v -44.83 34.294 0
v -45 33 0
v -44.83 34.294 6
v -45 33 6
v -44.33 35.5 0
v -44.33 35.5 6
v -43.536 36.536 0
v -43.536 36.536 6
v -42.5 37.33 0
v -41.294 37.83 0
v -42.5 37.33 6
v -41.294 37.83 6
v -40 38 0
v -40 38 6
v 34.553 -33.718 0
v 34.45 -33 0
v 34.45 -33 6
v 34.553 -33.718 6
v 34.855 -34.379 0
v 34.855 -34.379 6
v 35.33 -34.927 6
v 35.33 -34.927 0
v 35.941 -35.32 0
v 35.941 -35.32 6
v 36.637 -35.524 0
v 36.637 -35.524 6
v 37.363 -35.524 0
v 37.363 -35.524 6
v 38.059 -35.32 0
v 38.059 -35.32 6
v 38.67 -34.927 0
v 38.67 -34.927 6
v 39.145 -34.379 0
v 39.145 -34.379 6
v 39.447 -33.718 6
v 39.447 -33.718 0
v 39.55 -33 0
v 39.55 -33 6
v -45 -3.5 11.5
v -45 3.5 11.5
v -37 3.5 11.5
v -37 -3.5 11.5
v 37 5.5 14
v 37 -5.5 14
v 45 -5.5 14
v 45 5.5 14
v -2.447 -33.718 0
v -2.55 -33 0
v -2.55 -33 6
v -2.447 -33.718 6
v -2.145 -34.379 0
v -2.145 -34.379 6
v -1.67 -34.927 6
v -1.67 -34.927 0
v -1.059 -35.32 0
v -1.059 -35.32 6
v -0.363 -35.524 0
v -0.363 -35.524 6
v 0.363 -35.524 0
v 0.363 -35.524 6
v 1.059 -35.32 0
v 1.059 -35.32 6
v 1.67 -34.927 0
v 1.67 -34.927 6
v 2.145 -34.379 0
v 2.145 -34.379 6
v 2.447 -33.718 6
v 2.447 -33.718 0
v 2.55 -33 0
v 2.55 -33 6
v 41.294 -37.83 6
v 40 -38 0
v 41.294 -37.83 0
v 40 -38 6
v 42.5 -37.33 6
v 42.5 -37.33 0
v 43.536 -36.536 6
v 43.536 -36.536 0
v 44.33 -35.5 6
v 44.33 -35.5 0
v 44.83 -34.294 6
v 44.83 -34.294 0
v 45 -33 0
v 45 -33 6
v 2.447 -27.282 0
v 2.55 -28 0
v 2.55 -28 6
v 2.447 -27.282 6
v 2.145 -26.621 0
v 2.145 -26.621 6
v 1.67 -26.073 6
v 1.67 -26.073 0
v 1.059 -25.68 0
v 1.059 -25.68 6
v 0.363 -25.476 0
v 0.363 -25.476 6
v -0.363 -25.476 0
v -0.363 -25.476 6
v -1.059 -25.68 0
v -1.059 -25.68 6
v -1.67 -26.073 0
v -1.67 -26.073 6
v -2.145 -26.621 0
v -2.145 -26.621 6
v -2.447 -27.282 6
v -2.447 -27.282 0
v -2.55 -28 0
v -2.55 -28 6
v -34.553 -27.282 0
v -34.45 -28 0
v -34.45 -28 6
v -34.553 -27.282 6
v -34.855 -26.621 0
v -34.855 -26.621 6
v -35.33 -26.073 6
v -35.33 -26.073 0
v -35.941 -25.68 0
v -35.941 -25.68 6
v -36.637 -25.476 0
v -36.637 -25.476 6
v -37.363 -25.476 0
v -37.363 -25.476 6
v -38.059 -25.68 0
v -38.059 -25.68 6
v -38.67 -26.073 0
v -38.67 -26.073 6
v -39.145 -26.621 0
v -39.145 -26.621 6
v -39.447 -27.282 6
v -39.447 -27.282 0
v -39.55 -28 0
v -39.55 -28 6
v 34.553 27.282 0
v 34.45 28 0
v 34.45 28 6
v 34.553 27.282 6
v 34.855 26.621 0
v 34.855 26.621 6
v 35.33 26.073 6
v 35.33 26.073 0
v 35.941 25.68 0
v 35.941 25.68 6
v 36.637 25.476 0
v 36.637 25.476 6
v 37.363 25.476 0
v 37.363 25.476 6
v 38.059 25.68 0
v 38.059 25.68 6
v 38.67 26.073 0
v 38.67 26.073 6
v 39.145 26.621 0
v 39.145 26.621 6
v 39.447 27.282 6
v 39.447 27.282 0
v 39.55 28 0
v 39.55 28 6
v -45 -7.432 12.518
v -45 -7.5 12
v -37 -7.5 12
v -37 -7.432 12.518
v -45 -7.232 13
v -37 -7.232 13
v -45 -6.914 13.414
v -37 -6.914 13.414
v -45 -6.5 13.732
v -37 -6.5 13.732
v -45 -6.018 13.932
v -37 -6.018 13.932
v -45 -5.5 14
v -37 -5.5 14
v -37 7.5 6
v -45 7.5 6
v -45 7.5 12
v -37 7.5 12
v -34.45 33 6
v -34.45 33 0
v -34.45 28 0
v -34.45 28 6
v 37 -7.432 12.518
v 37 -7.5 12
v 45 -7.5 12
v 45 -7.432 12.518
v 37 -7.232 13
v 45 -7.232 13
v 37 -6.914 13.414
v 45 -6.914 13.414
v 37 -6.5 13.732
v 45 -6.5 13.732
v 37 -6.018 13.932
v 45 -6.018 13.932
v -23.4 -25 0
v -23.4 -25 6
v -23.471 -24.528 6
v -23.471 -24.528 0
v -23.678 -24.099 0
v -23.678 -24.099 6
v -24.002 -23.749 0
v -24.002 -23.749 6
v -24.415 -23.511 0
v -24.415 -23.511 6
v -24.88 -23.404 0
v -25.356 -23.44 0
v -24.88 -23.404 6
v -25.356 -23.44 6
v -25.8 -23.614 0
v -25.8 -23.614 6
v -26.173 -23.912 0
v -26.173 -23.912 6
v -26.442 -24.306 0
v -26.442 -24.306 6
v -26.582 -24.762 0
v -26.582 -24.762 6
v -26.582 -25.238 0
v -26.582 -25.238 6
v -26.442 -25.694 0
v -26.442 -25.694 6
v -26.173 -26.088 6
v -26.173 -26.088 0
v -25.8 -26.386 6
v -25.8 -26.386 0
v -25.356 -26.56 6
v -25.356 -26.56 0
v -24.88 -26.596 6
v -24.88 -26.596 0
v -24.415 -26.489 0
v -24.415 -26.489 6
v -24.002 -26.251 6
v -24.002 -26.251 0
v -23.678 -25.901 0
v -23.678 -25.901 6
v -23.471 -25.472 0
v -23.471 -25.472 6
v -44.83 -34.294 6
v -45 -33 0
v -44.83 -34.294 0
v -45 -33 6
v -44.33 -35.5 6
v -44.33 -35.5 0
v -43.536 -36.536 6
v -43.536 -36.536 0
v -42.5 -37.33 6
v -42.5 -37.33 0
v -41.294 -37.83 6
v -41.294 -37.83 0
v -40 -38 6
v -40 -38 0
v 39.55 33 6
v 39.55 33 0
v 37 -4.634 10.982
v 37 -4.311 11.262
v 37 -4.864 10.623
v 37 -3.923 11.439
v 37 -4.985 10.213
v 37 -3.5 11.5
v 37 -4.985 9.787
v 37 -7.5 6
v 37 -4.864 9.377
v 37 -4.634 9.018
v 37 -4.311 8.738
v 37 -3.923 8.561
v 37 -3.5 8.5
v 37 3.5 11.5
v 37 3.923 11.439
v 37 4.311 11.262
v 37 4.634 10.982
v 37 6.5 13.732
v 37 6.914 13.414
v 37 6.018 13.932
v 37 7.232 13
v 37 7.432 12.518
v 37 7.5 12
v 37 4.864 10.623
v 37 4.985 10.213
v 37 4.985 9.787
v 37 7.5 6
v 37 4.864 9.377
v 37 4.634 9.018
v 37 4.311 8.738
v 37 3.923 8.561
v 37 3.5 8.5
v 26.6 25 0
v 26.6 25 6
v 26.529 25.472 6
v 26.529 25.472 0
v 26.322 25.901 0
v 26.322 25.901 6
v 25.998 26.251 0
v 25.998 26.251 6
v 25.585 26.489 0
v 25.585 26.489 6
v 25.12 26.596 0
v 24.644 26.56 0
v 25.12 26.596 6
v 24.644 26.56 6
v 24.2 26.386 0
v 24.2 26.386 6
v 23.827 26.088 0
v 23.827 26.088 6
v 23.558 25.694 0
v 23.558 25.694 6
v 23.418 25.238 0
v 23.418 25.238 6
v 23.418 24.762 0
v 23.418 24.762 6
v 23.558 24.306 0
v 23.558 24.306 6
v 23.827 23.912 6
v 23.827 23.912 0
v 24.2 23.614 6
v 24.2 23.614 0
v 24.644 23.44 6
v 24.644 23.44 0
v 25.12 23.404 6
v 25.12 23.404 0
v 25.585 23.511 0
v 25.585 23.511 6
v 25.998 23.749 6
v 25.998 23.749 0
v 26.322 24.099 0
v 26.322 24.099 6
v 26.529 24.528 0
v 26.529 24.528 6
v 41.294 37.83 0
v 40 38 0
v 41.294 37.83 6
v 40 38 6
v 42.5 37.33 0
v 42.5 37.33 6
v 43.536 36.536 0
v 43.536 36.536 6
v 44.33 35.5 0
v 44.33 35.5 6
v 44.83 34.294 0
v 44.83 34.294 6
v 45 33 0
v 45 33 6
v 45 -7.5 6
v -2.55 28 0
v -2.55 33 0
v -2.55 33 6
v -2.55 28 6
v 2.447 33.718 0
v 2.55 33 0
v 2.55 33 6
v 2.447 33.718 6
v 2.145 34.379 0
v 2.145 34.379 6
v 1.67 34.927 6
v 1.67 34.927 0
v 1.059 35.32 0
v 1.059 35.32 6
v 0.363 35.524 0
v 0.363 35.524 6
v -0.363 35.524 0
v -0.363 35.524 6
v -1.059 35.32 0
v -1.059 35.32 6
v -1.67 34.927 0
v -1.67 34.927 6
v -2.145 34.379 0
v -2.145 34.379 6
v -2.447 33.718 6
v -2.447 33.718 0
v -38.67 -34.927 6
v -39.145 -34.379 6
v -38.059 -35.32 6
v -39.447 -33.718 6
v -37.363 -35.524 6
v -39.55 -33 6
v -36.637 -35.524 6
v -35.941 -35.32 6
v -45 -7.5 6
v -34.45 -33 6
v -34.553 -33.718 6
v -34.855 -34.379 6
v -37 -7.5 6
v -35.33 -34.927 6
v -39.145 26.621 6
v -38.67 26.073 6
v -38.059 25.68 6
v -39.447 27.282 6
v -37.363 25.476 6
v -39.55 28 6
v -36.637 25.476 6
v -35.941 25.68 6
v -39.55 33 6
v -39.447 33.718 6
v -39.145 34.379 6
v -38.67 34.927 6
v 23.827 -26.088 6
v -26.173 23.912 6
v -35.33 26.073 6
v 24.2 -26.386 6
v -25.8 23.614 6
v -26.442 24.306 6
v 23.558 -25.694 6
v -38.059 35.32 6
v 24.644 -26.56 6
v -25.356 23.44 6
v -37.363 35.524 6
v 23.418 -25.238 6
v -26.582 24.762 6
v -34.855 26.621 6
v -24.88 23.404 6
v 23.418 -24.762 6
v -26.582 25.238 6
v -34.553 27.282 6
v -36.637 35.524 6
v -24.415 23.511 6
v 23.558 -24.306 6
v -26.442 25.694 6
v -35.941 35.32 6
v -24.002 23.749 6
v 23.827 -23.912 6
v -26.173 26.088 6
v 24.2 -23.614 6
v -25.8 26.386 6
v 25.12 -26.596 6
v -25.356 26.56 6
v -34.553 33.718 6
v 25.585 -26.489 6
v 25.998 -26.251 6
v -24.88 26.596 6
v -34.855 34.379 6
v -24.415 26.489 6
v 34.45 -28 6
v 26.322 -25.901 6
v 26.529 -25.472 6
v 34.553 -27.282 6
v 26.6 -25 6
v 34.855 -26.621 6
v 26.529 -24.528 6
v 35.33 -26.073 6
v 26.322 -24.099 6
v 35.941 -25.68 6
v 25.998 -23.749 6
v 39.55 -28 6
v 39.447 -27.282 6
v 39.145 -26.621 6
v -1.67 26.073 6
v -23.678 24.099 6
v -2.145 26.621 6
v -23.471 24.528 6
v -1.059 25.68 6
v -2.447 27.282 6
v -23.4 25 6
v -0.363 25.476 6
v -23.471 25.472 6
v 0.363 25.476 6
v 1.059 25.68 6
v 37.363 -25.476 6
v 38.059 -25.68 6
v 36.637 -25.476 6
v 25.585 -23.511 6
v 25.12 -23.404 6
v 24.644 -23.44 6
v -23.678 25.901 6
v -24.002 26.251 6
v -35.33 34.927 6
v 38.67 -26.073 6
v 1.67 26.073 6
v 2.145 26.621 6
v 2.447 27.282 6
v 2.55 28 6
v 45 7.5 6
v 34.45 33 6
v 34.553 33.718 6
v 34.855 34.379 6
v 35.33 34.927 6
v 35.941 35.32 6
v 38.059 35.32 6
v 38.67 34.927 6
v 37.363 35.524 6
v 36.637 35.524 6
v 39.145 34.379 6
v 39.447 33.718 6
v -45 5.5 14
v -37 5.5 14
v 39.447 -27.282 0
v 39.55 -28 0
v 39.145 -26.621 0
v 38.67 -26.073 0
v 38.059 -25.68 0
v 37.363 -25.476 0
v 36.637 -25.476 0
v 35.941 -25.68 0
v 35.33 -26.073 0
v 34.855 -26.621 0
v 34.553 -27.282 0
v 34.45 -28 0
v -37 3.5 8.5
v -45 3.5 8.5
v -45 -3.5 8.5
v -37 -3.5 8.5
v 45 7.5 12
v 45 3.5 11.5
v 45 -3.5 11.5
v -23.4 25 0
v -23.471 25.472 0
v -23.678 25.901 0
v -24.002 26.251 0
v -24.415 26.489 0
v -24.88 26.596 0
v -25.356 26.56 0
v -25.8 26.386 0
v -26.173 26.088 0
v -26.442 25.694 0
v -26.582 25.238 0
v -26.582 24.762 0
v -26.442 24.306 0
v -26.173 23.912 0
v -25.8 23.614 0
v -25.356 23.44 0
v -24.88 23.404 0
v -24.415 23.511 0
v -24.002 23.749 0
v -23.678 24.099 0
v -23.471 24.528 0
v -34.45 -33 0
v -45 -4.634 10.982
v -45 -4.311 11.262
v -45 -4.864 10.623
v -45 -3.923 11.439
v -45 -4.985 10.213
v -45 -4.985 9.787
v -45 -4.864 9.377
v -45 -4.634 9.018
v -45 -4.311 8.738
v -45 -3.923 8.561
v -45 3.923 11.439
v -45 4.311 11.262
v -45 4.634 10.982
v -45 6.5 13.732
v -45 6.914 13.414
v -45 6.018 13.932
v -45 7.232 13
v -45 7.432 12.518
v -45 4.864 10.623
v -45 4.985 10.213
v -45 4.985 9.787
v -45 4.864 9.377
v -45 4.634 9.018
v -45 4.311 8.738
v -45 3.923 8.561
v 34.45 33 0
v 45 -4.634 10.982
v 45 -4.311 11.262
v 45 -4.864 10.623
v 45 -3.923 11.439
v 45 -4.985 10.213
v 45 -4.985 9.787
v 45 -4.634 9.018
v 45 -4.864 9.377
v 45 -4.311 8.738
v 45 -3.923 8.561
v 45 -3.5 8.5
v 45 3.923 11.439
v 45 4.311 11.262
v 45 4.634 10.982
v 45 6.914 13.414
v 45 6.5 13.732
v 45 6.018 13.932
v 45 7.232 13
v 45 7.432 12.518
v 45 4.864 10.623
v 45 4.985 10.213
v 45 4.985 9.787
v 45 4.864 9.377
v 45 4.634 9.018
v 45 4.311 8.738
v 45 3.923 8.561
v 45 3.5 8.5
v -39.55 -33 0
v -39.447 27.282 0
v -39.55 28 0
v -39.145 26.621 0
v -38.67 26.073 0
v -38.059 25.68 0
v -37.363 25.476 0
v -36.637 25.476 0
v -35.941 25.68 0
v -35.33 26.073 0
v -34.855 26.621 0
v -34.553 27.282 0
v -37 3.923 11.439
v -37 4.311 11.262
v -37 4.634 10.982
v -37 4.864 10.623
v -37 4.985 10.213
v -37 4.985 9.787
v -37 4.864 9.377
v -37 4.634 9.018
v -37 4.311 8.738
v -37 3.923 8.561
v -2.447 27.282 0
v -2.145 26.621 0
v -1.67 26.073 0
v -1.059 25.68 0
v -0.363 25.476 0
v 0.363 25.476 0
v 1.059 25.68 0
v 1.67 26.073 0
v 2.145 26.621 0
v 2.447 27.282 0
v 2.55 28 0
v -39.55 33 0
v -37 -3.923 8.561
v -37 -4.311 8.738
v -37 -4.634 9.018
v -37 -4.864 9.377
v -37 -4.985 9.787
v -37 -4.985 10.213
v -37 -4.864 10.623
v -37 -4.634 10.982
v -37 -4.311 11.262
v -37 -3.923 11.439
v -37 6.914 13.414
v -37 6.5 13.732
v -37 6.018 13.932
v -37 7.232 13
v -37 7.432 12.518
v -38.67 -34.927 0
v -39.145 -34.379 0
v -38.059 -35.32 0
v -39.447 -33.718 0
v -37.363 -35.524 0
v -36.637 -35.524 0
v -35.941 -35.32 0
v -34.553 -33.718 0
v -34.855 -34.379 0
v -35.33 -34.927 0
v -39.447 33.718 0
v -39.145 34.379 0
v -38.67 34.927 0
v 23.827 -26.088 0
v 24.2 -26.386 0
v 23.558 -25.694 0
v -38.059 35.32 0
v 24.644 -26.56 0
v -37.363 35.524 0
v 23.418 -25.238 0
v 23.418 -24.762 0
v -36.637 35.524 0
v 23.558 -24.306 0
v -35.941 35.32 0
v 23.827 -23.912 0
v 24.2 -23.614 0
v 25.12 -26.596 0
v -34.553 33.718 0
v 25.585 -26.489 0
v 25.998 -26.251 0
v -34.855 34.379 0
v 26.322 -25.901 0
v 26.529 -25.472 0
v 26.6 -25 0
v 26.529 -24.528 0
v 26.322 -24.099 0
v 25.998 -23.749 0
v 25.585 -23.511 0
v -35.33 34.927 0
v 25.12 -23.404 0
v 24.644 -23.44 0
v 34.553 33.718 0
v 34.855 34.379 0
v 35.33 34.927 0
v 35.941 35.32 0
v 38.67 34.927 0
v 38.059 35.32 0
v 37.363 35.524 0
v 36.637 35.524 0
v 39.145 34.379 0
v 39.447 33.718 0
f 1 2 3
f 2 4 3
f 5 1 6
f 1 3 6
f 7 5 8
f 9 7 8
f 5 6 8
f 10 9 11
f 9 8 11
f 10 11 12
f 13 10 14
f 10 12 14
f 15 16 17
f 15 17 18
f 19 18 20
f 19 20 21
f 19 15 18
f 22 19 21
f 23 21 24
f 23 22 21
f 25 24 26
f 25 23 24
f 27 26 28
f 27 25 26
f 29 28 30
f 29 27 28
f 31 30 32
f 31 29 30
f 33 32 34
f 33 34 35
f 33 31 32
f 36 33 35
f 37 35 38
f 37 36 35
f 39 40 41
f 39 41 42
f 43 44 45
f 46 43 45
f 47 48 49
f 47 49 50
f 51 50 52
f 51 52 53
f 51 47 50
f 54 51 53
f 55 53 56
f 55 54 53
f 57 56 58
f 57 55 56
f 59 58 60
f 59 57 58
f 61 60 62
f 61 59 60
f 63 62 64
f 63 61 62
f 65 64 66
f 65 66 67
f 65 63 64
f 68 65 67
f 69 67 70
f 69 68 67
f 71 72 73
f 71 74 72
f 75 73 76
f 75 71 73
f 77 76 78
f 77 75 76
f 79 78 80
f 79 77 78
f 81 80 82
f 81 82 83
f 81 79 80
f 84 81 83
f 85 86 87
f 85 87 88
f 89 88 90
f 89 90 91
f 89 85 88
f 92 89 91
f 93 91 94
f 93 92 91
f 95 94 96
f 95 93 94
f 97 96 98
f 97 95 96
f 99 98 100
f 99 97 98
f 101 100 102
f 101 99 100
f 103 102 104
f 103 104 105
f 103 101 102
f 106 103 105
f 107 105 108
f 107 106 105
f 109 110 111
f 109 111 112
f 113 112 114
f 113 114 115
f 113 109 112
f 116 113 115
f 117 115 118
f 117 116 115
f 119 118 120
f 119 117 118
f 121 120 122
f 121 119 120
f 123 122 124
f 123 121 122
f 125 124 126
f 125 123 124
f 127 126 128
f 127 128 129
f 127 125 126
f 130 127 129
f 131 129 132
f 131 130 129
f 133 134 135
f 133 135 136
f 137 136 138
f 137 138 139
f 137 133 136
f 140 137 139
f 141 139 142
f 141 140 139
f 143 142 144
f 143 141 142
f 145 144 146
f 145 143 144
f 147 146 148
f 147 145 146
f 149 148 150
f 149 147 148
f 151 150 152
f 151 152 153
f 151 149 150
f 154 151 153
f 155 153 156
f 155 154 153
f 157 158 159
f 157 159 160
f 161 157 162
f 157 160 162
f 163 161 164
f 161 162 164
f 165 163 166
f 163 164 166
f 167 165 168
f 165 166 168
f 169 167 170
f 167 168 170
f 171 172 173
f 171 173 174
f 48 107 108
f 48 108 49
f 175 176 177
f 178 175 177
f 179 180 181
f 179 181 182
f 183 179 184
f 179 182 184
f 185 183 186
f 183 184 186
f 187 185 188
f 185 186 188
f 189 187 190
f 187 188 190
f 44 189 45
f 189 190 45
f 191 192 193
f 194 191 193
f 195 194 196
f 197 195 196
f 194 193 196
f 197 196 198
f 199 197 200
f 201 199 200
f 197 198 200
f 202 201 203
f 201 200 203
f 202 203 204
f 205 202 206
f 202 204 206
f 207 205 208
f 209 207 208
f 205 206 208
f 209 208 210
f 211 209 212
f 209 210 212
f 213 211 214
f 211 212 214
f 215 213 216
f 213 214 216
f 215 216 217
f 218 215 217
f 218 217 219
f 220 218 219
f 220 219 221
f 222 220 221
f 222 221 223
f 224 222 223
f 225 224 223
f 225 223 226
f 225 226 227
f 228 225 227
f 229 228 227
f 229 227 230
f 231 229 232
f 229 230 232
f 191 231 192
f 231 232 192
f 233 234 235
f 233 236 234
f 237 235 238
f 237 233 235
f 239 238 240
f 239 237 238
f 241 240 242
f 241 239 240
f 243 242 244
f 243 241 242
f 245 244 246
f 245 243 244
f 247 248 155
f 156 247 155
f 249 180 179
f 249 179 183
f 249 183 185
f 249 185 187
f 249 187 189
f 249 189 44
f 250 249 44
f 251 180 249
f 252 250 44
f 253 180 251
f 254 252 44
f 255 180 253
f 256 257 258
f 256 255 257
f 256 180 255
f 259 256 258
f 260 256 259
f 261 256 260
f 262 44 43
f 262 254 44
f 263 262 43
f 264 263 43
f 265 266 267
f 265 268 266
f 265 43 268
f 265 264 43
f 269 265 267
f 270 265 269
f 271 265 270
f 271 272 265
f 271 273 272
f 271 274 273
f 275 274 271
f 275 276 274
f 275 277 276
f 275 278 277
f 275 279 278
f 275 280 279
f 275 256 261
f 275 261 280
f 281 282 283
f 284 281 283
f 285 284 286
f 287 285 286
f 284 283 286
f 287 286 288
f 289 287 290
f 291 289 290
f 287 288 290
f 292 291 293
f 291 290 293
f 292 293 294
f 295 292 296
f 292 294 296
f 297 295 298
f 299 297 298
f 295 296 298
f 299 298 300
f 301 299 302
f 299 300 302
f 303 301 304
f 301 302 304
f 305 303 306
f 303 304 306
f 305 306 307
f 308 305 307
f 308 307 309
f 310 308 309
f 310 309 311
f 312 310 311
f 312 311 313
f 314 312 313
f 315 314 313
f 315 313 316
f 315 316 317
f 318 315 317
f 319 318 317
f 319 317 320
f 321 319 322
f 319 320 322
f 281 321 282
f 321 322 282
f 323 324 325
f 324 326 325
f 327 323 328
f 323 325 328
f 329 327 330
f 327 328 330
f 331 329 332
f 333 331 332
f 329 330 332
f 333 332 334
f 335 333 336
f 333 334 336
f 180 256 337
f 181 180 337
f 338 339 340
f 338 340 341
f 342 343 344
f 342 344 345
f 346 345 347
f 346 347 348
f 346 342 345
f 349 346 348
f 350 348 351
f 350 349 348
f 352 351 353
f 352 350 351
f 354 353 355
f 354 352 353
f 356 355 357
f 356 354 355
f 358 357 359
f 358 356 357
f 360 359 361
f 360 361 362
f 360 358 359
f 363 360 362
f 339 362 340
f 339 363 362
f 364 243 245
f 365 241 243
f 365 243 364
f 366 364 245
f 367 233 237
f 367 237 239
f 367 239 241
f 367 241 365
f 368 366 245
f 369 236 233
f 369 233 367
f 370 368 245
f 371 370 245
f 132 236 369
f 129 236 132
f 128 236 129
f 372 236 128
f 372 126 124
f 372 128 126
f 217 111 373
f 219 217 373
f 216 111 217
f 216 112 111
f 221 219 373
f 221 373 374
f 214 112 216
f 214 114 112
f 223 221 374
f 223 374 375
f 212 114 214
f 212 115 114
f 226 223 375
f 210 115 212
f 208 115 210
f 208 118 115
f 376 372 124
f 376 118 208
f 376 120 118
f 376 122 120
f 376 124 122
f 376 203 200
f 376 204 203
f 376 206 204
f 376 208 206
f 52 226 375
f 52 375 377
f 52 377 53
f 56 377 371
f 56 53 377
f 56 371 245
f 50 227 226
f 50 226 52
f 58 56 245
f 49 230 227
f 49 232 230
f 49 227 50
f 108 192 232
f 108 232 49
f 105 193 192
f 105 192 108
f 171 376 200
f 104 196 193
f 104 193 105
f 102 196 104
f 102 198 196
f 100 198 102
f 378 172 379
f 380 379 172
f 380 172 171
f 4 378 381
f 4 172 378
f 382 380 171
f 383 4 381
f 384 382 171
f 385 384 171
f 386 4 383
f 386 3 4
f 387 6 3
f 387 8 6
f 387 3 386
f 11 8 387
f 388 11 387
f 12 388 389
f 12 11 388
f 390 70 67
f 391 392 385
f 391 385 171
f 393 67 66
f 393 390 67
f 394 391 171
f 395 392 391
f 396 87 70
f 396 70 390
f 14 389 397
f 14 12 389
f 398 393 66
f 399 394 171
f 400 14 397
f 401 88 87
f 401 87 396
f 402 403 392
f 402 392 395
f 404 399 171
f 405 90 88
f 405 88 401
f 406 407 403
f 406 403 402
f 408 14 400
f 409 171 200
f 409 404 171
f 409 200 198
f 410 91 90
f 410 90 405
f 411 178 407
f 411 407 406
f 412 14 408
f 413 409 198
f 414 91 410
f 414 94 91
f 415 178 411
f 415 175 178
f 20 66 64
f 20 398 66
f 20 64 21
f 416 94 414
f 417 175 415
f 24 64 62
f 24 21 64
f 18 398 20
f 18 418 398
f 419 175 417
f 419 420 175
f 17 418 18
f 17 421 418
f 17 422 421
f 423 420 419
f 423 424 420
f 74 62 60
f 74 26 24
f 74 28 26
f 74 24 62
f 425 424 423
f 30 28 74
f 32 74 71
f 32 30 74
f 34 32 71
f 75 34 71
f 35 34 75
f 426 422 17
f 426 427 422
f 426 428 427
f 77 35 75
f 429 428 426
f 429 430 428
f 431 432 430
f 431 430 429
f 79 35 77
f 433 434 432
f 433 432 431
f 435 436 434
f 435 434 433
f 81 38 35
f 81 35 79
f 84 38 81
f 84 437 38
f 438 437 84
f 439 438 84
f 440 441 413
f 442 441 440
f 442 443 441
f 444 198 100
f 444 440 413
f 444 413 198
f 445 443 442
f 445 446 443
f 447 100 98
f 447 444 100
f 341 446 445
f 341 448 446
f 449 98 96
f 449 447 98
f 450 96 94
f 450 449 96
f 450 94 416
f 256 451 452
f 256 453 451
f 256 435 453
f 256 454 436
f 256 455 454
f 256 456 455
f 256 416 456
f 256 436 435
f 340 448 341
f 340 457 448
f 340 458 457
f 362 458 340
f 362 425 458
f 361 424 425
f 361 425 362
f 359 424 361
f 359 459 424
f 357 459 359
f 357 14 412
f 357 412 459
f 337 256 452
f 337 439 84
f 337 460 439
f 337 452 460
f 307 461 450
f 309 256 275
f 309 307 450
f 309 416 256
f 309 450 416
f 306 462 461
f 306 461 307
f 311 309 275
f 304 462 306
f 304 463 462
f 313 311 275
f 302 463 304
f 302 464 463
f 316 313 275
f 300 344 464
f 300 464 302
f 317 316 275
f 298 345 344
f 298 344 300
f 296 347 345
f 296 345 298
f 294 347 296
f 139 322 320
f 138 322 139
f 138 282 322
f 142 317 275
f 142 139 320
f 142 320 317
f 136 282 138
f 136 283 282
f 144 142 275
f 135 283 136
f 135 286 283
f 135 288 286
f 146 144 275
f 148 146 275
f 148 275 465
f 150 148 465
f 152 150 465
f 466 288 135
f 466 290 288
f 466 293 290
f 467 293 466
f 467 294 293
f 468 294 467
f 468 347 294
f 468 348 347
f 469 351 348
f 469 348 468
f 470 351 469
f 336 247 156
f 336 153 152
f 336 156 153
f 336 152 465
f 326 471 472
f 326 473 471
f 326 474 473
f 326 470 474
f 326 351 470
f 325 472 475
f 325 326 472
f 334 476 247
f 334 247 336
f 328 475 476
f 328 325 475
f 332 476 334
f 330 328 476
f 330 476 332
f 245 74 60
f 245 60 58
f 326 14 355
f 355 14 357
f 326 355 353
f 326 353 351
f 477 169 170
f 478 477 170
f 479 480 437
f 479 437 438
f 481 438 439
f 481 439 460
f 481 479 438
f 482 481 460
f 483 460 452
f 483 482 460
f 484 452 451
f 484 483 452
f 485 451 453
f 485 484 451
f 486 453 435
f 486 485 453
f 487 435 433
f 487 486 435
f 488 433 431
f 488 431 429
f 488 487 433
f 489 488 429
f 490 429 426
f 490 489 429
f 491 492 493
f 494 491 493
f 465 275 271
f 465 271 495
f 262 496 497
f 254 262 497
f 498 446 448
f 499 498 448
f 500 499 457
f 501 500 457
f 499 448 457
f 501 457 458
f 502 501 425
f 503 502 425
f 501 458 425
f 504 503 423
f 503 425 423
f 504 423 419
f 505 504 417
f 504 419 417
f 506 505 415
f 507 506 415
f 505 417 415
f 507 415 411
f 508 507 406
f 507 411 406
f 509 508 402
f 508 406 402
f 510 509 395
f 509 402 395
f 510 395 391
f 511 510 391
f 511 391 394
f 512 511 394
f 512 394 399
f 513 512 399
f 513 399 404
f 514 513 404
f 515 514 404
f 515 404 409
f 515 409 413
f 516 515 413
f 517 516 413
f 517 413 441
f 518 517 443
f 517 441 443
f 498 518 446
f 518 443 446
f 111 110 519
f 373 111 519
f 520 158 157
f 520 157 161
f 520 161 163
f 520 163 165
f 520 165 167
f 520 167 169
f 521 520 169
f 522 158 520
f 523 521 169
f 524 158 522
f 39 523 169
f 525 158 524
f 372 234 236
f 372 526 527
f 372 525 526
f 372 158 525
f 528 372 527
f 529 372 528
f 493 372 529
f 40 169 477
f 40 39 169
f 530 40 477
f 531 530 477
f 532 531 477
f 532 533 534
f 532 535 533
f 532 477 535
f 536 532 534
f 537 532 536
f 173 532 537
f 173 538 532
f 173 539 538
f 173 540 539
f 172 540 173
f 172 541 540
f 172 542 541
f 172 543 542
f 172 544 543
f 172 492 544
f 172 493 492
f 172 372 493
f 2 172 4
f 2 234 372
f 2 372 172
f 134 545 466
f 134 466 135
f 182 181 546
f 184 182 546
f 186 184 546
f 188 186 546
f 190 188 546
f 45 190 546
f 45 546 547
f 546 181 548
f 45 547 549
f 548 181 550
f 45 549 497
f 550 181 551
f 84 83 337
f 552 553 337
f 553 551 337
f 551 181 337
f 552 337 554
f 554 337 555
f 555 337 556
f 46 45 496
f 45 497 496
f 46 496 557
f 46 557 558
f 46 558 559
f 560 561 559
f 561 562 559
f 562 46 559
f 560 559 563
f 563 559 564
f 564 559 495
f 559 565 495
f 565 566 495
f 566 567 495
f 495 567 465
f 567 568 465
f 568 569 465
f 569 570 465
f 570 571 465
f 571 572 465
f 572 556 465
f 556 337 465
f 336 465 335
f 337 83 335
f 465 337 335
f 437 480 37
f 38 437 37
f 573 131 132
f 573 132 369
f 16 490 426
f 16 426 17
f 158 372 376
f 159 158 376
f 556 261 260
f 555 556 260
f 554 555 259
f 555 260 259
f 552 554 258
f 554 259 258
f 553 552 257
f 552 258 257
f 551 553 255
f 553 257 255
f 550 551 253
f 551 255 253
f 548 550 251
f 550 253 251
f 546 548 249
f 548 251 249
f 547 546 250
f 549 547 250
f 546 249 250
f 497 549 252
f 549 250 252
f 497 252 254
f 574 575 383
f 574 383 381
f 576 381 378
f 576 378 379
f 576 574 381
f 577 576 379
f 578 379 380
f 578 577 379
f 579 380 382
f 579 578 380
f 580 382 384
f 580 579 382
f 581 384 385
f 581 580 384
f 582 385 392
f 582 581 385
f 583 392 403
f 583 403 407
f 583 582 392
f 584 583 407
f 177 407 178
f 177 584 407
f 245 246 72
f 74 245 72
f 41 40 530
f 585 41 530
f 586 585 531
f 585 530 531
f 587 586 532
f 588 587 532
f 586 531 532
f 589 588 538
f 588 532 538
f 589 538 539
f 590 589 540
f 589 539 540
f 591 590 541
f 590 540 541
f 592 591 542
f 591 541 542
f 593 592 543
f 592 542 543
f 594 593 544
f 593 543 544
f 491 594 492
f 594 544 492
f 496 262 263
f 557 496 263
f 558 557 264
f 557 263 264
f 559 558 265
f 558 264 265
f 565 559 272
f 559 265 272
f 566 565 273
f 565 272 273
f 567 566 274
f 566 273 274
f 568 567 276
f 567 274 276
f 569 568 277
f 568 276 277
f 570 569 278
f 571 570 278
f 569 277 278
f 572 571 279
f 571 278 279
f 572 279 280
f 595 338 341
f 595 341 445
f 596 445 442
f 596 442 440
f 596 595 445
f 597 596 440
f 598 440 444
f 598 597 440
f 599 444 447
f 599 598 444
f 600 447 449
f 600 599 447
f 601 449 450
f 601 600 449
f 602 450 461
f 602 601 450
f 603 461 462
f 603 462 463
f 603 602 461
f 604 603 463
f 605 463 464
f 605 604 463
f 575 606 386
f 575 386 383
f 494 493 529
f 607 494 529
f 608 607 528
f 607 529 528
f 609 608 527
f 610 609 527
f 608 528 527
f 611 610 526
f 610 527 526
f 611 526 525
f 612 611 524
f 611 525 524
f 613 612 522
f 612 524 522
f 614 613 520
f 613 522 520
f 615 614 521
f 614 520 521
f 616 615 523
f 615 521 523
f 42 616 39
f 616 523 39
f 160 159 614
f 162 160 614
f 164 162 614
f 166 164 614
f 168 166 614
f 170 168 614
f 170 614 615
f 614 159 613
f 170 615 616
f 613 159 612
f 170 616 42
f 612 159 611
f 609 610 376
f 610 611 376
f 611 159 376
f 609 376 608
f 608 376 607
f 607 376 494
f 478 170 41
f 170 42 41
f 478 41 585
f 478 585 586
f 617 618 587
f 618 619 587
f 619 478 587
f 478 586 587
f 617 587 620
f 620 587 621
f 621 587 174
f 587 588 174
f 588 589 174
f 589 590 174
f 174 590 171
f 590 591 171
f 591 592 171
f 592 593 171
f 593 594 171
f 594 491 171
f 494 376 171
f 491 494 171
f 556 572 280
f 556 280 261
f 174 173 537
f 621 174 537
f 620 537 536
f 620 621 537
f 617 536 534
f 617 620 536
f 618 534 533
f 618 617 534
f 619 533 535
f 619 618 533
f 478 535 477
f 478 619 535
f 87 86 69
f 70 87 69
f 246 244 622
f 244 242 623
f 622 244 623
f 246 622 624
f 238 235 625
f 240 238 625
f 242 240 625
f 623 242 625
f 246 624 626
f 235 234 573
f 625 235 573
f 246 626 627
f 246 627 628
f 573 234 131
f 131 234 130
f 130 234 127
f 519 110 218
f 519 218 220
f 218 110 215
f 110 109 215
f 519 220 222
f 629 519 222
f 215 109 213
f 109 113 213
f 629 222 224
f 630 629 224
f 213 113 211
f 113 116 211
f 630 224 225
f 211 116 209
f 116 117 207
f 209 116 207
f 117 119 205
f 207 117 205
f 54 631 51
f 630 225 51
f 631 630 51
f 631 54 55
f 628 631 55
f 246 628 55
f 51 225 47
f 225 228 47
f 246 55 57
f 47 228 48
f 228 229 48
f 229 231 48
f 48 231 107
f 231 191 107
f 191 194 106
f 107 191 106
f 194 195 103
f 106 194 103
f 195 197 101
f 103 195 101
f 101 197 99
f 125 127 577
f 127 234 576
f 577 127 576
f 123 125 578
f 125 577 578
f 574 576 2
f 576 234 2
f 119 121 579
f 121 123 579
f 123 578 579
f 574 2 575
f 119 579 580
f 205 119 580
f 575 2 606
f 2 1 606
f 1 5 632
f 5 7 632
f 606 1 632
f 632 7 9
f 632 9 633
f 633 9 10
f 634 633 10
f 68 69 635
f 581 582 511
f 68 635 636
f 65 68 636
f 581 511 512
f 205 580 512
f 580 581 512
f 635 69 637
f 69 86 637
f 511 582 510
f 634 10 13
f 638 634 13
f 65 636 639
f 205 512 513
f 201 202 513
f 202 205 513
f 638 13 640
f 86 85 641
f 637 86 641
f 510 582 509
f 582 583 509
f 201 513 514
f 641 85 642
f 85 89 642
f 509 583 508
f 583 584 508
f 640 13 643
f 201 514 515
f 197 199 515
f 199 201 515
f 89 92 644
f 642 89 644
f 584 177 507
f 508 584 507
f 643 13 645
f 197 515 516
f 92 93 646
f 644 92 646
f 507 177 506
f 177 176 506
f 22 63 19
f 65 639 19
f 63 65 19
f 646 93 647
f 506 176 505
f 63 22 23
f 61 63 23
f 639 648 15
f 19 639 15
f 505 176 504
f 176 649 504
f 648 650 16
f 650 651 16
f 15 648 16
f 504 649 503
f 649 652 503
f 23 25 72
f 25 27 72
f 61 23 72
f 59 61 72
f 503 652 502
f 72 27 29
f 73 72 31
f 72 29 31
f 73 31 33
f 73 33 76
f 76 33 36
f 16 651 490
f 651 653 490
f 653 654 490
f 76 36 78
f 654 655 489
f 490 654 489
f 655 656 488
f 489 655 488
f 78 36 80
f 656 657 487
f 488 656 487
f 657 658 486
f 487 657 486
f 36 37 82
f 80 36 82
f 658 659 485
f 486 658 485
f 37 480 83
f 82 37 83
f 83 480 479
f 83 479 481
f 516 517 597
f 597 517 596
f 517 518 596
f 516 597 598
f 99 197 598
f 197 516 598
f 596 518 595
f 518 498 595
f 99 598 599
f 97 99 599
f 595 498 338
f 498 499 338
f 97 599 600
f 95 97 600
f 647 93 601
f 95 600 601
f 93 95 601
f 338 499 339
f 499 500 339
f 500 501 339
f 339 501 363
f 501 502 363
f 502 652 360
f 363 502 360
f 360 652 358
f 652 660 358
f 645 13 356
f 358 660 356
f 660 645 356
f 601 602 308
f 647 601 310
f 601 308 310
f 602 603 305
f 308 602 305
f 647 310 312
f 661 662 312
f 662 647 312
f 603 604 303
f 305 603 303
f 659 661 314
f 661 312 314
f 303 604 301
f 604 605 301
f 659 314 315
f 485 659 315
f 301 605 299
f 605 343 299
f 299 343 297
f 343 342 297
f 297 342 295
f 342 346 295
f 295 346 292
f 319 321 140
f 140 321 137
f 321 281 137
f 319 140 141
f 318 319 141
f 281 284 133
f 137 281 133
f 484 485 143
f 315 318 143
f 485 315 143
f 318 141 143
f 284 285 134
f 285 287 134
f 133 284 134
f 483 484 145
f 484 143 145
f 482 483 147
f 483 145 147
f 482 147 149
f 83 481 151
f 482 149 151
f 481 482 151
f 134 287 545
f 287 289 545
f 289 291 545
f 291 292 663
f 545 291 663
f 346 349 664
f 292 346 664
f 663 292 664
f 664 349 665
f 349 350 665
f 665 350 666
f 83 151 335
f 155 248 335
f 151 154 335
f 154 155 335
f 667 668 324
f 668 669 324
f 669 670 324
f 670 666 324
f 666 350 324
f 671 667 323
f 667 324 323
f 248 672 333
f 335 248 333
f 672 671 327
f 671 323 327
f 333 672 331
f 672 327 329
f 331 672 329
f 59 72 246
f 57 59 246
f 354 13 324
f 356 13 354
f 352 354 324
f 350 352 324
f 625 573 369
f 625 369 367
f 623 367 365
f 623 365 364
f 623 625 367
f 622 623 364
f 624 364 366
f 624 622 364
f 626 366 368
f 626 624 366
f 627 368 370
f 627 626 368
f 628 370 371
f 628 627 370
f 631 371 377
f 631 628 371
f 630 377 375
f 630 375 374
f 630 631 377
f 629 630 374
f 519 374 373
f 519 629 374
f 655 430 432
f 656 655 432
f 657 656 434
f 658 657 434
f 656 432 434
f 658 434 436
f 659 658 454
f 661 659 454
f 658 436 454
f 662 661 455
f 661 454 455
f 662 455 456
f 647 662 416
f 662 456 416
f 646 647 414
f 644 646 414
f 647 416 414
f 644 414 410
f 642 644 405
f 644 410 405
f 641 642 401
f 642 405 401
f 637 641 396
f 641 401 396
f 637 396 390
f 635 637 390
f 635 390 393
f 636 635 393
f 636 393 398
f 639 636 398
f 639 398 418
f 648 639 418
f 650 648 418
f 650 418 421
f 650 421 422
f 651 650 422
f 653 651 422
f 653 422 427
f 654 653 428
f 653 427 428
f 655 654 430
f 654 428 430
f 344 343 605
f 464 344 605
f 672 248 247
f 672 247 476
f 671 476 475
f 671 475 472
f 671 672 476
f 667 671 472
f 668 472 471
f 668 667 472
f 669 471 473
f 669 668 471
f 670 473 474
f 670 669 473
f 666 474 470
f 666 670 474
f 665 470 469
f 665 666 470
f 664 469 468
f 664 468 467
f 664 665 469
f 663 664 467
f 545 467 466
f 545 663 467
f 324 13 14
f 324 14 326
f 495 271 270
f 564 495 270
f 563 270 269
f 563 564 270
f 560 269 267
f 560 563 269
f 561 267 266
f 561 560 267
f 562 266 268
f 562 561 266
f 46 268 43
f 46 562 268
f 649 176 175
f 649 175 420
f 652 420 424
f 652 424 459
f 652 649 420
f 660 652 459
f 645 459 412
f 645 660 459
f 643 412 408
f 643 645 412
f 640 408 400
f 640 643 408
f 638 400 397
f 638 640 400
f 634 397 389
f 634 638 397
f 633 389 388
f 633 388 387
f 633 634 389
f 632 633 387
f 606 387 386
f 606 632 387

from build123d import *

# Parameters (mm, degrees)
SKETCH_W        = 90
SKETCH_H        = 76
PAD_DEPTH       = 6
FILLET_R        = 5
SKETCH001_R     = 1.6
POCKET_DEPTH    = 6
SKETCH002_W     = 8
SKETCH002_H     = 15
PAD001_DEPTH    = 8
POCKET001_DEPTH = 90.001
FILLET001_R     = 2


with BuildPart() as part:
    # Sketch → Pad (new body)
    with BuildSketch(Plane.XY):
        Rectangle(SKETCH_W, SKETCH_H)
        with BuildLine():
            ThreePointArc((-34.45, 33), (-37, 35.55), (-39.55, 33))
            Line((-39.55, 33), (-39.55, 28))
            ThreePointArc((-39.55, 28), (-37, 25.45), (-34.45, 28))
            Line((-34.45, 33), (-34.45, 28))
        make_face(mode=Mode.SUBTRACT)
        with BuildLine():
            ThreePointArc((2.55, 33), (0, 35.55), (-2.55, 33))
            Line((-2.55, 33), (-2.55, 28))
            ThreePointArc((-2.55, 28), (0, 25.45), (2.55, 28))
            Line((2.55, 33), (2.55, 28))
        make_face(mode=Mode.SUBTRACT)
        with BuildLine():
            ThreePointArc((39.55, -28), (37, -25.45), (34.45, -28))
            Line((34.45, -28), (34.45, -33))
            ThreePointArc((34.45, -33), (37, -35.55), (39.55, -33))
            Line((39.55, -28), (39.55, -33))
        make_face(mode=Mode.SUBTRACT)
        with BuildLine():
            ThreePointArc((2.55, -28), (0, -25.45), (-2.55, -28))
            Line((-2.55, -28), (-2.55, -33))
            ThreePointArc((-2.55, -33), (0, -35.55), (2.55, -33))
            Line((2.55, -28), (2.55, -33))
        make_face(mode=Mode.SUBTRACT)
        with BuildLine():
            ThreePointArc((-34.45, -28), (-37, -25.45), (-39.55, -28))
            Line((-39.55, -28), (-39.55, -33))
            ThreePointArc((-39.55, -33), (-37, -35.55), (-34.45, -33))
            Line((-34.45, -28), (-34.45, -33))
        make_face(mode=Mode.SUBTRACT)
        with BuildLine():
            ThreePointArc((39.55, 33), (37, 35.55), (34.45, 33))
            Line((34.45, 33), (34.45, 28))
            ThreePointArc((34.45, 28), (37, 25.45), (39.55, 28))
            Line((39.55, 33), (39.55, 28))
        make_face(mode=Mode.SUBTRACT)
    extrude(amount=PAD_DEPTH)

    # Fillet
    fillet_edges = [part.edges().sort_by_distance(p)[0] for p in [
        (45, -38, 3),
        (-45, -38, 3),
        (45, 38, 3),
        (-45, 38, 3),
    ]]
    fillet(fillet_edges, radius=FILLET_R)

    # Sketch001 (on Face5 of Fillet) → Pocket (cut)
    with BuildSketch(Plane.XY.offset(6)):
        with Locations((25, 25)):
            Circle(SKETCH001_R)
        with Locations((25, -25)):
            Circle(SKETCH001_R)
        with Locations((-25, 25)):
            Circle(SKETCH001_R)
        with Locations((-25, -25)):
            Circle(SKETCH001_R)
    extrude(amount=-POCKET_DEPTH, mode=Mode.SUBTRACT)

    # Sketch002 (on Face5 of Pocket) → Pad001 (join)
    with BuildSketch(Plane.XY.offset(6)):
        with Locations((-41, 0)):
            Rectangle(SKETCH002_W, SKETCH002_H)
        with Locations((41, 0)):
            Rectangle(SKETCH002_W, SKETCH002_H)
    extrude(amount=PAD001_DEPTH)

    # Sketch003 (on Face6 of Pad001) → Pocket001 (cut, through all)
    with BuildSketch(Plane(origin=(-45, 0, 0), x_dir=(0, -1, 0), z_dir=(-1, 0, 0))):
        with BuildLine():
            ThreePointArc((-3.5, 11.5), (-5, 10), (-3.5, 8.5))
            Line((-3.5, 8.5), (3.5, 8.5))
            ThreePointArc((3.5, 8.5), (5, 10), (3.5, 11.5))
            Line((-3.5, 11.5), (3.5, 11.5))
        make_face()
    extrude(amount=-POCKET001_DEPTH, mode=Mode.SUBTRACT)

    # Fillet001
    fillet001_edges = [part.edges().sort_by_distance(p)[0] for p in [
        (-41, 7.5, 14),
        (-41, -7.5, 14),
        (41, -7.5, 14),
        (41, 7.5, 14),
    ]]
    fillet(fillet001_edges, radius=FILLET001_R)


solid = part.part
